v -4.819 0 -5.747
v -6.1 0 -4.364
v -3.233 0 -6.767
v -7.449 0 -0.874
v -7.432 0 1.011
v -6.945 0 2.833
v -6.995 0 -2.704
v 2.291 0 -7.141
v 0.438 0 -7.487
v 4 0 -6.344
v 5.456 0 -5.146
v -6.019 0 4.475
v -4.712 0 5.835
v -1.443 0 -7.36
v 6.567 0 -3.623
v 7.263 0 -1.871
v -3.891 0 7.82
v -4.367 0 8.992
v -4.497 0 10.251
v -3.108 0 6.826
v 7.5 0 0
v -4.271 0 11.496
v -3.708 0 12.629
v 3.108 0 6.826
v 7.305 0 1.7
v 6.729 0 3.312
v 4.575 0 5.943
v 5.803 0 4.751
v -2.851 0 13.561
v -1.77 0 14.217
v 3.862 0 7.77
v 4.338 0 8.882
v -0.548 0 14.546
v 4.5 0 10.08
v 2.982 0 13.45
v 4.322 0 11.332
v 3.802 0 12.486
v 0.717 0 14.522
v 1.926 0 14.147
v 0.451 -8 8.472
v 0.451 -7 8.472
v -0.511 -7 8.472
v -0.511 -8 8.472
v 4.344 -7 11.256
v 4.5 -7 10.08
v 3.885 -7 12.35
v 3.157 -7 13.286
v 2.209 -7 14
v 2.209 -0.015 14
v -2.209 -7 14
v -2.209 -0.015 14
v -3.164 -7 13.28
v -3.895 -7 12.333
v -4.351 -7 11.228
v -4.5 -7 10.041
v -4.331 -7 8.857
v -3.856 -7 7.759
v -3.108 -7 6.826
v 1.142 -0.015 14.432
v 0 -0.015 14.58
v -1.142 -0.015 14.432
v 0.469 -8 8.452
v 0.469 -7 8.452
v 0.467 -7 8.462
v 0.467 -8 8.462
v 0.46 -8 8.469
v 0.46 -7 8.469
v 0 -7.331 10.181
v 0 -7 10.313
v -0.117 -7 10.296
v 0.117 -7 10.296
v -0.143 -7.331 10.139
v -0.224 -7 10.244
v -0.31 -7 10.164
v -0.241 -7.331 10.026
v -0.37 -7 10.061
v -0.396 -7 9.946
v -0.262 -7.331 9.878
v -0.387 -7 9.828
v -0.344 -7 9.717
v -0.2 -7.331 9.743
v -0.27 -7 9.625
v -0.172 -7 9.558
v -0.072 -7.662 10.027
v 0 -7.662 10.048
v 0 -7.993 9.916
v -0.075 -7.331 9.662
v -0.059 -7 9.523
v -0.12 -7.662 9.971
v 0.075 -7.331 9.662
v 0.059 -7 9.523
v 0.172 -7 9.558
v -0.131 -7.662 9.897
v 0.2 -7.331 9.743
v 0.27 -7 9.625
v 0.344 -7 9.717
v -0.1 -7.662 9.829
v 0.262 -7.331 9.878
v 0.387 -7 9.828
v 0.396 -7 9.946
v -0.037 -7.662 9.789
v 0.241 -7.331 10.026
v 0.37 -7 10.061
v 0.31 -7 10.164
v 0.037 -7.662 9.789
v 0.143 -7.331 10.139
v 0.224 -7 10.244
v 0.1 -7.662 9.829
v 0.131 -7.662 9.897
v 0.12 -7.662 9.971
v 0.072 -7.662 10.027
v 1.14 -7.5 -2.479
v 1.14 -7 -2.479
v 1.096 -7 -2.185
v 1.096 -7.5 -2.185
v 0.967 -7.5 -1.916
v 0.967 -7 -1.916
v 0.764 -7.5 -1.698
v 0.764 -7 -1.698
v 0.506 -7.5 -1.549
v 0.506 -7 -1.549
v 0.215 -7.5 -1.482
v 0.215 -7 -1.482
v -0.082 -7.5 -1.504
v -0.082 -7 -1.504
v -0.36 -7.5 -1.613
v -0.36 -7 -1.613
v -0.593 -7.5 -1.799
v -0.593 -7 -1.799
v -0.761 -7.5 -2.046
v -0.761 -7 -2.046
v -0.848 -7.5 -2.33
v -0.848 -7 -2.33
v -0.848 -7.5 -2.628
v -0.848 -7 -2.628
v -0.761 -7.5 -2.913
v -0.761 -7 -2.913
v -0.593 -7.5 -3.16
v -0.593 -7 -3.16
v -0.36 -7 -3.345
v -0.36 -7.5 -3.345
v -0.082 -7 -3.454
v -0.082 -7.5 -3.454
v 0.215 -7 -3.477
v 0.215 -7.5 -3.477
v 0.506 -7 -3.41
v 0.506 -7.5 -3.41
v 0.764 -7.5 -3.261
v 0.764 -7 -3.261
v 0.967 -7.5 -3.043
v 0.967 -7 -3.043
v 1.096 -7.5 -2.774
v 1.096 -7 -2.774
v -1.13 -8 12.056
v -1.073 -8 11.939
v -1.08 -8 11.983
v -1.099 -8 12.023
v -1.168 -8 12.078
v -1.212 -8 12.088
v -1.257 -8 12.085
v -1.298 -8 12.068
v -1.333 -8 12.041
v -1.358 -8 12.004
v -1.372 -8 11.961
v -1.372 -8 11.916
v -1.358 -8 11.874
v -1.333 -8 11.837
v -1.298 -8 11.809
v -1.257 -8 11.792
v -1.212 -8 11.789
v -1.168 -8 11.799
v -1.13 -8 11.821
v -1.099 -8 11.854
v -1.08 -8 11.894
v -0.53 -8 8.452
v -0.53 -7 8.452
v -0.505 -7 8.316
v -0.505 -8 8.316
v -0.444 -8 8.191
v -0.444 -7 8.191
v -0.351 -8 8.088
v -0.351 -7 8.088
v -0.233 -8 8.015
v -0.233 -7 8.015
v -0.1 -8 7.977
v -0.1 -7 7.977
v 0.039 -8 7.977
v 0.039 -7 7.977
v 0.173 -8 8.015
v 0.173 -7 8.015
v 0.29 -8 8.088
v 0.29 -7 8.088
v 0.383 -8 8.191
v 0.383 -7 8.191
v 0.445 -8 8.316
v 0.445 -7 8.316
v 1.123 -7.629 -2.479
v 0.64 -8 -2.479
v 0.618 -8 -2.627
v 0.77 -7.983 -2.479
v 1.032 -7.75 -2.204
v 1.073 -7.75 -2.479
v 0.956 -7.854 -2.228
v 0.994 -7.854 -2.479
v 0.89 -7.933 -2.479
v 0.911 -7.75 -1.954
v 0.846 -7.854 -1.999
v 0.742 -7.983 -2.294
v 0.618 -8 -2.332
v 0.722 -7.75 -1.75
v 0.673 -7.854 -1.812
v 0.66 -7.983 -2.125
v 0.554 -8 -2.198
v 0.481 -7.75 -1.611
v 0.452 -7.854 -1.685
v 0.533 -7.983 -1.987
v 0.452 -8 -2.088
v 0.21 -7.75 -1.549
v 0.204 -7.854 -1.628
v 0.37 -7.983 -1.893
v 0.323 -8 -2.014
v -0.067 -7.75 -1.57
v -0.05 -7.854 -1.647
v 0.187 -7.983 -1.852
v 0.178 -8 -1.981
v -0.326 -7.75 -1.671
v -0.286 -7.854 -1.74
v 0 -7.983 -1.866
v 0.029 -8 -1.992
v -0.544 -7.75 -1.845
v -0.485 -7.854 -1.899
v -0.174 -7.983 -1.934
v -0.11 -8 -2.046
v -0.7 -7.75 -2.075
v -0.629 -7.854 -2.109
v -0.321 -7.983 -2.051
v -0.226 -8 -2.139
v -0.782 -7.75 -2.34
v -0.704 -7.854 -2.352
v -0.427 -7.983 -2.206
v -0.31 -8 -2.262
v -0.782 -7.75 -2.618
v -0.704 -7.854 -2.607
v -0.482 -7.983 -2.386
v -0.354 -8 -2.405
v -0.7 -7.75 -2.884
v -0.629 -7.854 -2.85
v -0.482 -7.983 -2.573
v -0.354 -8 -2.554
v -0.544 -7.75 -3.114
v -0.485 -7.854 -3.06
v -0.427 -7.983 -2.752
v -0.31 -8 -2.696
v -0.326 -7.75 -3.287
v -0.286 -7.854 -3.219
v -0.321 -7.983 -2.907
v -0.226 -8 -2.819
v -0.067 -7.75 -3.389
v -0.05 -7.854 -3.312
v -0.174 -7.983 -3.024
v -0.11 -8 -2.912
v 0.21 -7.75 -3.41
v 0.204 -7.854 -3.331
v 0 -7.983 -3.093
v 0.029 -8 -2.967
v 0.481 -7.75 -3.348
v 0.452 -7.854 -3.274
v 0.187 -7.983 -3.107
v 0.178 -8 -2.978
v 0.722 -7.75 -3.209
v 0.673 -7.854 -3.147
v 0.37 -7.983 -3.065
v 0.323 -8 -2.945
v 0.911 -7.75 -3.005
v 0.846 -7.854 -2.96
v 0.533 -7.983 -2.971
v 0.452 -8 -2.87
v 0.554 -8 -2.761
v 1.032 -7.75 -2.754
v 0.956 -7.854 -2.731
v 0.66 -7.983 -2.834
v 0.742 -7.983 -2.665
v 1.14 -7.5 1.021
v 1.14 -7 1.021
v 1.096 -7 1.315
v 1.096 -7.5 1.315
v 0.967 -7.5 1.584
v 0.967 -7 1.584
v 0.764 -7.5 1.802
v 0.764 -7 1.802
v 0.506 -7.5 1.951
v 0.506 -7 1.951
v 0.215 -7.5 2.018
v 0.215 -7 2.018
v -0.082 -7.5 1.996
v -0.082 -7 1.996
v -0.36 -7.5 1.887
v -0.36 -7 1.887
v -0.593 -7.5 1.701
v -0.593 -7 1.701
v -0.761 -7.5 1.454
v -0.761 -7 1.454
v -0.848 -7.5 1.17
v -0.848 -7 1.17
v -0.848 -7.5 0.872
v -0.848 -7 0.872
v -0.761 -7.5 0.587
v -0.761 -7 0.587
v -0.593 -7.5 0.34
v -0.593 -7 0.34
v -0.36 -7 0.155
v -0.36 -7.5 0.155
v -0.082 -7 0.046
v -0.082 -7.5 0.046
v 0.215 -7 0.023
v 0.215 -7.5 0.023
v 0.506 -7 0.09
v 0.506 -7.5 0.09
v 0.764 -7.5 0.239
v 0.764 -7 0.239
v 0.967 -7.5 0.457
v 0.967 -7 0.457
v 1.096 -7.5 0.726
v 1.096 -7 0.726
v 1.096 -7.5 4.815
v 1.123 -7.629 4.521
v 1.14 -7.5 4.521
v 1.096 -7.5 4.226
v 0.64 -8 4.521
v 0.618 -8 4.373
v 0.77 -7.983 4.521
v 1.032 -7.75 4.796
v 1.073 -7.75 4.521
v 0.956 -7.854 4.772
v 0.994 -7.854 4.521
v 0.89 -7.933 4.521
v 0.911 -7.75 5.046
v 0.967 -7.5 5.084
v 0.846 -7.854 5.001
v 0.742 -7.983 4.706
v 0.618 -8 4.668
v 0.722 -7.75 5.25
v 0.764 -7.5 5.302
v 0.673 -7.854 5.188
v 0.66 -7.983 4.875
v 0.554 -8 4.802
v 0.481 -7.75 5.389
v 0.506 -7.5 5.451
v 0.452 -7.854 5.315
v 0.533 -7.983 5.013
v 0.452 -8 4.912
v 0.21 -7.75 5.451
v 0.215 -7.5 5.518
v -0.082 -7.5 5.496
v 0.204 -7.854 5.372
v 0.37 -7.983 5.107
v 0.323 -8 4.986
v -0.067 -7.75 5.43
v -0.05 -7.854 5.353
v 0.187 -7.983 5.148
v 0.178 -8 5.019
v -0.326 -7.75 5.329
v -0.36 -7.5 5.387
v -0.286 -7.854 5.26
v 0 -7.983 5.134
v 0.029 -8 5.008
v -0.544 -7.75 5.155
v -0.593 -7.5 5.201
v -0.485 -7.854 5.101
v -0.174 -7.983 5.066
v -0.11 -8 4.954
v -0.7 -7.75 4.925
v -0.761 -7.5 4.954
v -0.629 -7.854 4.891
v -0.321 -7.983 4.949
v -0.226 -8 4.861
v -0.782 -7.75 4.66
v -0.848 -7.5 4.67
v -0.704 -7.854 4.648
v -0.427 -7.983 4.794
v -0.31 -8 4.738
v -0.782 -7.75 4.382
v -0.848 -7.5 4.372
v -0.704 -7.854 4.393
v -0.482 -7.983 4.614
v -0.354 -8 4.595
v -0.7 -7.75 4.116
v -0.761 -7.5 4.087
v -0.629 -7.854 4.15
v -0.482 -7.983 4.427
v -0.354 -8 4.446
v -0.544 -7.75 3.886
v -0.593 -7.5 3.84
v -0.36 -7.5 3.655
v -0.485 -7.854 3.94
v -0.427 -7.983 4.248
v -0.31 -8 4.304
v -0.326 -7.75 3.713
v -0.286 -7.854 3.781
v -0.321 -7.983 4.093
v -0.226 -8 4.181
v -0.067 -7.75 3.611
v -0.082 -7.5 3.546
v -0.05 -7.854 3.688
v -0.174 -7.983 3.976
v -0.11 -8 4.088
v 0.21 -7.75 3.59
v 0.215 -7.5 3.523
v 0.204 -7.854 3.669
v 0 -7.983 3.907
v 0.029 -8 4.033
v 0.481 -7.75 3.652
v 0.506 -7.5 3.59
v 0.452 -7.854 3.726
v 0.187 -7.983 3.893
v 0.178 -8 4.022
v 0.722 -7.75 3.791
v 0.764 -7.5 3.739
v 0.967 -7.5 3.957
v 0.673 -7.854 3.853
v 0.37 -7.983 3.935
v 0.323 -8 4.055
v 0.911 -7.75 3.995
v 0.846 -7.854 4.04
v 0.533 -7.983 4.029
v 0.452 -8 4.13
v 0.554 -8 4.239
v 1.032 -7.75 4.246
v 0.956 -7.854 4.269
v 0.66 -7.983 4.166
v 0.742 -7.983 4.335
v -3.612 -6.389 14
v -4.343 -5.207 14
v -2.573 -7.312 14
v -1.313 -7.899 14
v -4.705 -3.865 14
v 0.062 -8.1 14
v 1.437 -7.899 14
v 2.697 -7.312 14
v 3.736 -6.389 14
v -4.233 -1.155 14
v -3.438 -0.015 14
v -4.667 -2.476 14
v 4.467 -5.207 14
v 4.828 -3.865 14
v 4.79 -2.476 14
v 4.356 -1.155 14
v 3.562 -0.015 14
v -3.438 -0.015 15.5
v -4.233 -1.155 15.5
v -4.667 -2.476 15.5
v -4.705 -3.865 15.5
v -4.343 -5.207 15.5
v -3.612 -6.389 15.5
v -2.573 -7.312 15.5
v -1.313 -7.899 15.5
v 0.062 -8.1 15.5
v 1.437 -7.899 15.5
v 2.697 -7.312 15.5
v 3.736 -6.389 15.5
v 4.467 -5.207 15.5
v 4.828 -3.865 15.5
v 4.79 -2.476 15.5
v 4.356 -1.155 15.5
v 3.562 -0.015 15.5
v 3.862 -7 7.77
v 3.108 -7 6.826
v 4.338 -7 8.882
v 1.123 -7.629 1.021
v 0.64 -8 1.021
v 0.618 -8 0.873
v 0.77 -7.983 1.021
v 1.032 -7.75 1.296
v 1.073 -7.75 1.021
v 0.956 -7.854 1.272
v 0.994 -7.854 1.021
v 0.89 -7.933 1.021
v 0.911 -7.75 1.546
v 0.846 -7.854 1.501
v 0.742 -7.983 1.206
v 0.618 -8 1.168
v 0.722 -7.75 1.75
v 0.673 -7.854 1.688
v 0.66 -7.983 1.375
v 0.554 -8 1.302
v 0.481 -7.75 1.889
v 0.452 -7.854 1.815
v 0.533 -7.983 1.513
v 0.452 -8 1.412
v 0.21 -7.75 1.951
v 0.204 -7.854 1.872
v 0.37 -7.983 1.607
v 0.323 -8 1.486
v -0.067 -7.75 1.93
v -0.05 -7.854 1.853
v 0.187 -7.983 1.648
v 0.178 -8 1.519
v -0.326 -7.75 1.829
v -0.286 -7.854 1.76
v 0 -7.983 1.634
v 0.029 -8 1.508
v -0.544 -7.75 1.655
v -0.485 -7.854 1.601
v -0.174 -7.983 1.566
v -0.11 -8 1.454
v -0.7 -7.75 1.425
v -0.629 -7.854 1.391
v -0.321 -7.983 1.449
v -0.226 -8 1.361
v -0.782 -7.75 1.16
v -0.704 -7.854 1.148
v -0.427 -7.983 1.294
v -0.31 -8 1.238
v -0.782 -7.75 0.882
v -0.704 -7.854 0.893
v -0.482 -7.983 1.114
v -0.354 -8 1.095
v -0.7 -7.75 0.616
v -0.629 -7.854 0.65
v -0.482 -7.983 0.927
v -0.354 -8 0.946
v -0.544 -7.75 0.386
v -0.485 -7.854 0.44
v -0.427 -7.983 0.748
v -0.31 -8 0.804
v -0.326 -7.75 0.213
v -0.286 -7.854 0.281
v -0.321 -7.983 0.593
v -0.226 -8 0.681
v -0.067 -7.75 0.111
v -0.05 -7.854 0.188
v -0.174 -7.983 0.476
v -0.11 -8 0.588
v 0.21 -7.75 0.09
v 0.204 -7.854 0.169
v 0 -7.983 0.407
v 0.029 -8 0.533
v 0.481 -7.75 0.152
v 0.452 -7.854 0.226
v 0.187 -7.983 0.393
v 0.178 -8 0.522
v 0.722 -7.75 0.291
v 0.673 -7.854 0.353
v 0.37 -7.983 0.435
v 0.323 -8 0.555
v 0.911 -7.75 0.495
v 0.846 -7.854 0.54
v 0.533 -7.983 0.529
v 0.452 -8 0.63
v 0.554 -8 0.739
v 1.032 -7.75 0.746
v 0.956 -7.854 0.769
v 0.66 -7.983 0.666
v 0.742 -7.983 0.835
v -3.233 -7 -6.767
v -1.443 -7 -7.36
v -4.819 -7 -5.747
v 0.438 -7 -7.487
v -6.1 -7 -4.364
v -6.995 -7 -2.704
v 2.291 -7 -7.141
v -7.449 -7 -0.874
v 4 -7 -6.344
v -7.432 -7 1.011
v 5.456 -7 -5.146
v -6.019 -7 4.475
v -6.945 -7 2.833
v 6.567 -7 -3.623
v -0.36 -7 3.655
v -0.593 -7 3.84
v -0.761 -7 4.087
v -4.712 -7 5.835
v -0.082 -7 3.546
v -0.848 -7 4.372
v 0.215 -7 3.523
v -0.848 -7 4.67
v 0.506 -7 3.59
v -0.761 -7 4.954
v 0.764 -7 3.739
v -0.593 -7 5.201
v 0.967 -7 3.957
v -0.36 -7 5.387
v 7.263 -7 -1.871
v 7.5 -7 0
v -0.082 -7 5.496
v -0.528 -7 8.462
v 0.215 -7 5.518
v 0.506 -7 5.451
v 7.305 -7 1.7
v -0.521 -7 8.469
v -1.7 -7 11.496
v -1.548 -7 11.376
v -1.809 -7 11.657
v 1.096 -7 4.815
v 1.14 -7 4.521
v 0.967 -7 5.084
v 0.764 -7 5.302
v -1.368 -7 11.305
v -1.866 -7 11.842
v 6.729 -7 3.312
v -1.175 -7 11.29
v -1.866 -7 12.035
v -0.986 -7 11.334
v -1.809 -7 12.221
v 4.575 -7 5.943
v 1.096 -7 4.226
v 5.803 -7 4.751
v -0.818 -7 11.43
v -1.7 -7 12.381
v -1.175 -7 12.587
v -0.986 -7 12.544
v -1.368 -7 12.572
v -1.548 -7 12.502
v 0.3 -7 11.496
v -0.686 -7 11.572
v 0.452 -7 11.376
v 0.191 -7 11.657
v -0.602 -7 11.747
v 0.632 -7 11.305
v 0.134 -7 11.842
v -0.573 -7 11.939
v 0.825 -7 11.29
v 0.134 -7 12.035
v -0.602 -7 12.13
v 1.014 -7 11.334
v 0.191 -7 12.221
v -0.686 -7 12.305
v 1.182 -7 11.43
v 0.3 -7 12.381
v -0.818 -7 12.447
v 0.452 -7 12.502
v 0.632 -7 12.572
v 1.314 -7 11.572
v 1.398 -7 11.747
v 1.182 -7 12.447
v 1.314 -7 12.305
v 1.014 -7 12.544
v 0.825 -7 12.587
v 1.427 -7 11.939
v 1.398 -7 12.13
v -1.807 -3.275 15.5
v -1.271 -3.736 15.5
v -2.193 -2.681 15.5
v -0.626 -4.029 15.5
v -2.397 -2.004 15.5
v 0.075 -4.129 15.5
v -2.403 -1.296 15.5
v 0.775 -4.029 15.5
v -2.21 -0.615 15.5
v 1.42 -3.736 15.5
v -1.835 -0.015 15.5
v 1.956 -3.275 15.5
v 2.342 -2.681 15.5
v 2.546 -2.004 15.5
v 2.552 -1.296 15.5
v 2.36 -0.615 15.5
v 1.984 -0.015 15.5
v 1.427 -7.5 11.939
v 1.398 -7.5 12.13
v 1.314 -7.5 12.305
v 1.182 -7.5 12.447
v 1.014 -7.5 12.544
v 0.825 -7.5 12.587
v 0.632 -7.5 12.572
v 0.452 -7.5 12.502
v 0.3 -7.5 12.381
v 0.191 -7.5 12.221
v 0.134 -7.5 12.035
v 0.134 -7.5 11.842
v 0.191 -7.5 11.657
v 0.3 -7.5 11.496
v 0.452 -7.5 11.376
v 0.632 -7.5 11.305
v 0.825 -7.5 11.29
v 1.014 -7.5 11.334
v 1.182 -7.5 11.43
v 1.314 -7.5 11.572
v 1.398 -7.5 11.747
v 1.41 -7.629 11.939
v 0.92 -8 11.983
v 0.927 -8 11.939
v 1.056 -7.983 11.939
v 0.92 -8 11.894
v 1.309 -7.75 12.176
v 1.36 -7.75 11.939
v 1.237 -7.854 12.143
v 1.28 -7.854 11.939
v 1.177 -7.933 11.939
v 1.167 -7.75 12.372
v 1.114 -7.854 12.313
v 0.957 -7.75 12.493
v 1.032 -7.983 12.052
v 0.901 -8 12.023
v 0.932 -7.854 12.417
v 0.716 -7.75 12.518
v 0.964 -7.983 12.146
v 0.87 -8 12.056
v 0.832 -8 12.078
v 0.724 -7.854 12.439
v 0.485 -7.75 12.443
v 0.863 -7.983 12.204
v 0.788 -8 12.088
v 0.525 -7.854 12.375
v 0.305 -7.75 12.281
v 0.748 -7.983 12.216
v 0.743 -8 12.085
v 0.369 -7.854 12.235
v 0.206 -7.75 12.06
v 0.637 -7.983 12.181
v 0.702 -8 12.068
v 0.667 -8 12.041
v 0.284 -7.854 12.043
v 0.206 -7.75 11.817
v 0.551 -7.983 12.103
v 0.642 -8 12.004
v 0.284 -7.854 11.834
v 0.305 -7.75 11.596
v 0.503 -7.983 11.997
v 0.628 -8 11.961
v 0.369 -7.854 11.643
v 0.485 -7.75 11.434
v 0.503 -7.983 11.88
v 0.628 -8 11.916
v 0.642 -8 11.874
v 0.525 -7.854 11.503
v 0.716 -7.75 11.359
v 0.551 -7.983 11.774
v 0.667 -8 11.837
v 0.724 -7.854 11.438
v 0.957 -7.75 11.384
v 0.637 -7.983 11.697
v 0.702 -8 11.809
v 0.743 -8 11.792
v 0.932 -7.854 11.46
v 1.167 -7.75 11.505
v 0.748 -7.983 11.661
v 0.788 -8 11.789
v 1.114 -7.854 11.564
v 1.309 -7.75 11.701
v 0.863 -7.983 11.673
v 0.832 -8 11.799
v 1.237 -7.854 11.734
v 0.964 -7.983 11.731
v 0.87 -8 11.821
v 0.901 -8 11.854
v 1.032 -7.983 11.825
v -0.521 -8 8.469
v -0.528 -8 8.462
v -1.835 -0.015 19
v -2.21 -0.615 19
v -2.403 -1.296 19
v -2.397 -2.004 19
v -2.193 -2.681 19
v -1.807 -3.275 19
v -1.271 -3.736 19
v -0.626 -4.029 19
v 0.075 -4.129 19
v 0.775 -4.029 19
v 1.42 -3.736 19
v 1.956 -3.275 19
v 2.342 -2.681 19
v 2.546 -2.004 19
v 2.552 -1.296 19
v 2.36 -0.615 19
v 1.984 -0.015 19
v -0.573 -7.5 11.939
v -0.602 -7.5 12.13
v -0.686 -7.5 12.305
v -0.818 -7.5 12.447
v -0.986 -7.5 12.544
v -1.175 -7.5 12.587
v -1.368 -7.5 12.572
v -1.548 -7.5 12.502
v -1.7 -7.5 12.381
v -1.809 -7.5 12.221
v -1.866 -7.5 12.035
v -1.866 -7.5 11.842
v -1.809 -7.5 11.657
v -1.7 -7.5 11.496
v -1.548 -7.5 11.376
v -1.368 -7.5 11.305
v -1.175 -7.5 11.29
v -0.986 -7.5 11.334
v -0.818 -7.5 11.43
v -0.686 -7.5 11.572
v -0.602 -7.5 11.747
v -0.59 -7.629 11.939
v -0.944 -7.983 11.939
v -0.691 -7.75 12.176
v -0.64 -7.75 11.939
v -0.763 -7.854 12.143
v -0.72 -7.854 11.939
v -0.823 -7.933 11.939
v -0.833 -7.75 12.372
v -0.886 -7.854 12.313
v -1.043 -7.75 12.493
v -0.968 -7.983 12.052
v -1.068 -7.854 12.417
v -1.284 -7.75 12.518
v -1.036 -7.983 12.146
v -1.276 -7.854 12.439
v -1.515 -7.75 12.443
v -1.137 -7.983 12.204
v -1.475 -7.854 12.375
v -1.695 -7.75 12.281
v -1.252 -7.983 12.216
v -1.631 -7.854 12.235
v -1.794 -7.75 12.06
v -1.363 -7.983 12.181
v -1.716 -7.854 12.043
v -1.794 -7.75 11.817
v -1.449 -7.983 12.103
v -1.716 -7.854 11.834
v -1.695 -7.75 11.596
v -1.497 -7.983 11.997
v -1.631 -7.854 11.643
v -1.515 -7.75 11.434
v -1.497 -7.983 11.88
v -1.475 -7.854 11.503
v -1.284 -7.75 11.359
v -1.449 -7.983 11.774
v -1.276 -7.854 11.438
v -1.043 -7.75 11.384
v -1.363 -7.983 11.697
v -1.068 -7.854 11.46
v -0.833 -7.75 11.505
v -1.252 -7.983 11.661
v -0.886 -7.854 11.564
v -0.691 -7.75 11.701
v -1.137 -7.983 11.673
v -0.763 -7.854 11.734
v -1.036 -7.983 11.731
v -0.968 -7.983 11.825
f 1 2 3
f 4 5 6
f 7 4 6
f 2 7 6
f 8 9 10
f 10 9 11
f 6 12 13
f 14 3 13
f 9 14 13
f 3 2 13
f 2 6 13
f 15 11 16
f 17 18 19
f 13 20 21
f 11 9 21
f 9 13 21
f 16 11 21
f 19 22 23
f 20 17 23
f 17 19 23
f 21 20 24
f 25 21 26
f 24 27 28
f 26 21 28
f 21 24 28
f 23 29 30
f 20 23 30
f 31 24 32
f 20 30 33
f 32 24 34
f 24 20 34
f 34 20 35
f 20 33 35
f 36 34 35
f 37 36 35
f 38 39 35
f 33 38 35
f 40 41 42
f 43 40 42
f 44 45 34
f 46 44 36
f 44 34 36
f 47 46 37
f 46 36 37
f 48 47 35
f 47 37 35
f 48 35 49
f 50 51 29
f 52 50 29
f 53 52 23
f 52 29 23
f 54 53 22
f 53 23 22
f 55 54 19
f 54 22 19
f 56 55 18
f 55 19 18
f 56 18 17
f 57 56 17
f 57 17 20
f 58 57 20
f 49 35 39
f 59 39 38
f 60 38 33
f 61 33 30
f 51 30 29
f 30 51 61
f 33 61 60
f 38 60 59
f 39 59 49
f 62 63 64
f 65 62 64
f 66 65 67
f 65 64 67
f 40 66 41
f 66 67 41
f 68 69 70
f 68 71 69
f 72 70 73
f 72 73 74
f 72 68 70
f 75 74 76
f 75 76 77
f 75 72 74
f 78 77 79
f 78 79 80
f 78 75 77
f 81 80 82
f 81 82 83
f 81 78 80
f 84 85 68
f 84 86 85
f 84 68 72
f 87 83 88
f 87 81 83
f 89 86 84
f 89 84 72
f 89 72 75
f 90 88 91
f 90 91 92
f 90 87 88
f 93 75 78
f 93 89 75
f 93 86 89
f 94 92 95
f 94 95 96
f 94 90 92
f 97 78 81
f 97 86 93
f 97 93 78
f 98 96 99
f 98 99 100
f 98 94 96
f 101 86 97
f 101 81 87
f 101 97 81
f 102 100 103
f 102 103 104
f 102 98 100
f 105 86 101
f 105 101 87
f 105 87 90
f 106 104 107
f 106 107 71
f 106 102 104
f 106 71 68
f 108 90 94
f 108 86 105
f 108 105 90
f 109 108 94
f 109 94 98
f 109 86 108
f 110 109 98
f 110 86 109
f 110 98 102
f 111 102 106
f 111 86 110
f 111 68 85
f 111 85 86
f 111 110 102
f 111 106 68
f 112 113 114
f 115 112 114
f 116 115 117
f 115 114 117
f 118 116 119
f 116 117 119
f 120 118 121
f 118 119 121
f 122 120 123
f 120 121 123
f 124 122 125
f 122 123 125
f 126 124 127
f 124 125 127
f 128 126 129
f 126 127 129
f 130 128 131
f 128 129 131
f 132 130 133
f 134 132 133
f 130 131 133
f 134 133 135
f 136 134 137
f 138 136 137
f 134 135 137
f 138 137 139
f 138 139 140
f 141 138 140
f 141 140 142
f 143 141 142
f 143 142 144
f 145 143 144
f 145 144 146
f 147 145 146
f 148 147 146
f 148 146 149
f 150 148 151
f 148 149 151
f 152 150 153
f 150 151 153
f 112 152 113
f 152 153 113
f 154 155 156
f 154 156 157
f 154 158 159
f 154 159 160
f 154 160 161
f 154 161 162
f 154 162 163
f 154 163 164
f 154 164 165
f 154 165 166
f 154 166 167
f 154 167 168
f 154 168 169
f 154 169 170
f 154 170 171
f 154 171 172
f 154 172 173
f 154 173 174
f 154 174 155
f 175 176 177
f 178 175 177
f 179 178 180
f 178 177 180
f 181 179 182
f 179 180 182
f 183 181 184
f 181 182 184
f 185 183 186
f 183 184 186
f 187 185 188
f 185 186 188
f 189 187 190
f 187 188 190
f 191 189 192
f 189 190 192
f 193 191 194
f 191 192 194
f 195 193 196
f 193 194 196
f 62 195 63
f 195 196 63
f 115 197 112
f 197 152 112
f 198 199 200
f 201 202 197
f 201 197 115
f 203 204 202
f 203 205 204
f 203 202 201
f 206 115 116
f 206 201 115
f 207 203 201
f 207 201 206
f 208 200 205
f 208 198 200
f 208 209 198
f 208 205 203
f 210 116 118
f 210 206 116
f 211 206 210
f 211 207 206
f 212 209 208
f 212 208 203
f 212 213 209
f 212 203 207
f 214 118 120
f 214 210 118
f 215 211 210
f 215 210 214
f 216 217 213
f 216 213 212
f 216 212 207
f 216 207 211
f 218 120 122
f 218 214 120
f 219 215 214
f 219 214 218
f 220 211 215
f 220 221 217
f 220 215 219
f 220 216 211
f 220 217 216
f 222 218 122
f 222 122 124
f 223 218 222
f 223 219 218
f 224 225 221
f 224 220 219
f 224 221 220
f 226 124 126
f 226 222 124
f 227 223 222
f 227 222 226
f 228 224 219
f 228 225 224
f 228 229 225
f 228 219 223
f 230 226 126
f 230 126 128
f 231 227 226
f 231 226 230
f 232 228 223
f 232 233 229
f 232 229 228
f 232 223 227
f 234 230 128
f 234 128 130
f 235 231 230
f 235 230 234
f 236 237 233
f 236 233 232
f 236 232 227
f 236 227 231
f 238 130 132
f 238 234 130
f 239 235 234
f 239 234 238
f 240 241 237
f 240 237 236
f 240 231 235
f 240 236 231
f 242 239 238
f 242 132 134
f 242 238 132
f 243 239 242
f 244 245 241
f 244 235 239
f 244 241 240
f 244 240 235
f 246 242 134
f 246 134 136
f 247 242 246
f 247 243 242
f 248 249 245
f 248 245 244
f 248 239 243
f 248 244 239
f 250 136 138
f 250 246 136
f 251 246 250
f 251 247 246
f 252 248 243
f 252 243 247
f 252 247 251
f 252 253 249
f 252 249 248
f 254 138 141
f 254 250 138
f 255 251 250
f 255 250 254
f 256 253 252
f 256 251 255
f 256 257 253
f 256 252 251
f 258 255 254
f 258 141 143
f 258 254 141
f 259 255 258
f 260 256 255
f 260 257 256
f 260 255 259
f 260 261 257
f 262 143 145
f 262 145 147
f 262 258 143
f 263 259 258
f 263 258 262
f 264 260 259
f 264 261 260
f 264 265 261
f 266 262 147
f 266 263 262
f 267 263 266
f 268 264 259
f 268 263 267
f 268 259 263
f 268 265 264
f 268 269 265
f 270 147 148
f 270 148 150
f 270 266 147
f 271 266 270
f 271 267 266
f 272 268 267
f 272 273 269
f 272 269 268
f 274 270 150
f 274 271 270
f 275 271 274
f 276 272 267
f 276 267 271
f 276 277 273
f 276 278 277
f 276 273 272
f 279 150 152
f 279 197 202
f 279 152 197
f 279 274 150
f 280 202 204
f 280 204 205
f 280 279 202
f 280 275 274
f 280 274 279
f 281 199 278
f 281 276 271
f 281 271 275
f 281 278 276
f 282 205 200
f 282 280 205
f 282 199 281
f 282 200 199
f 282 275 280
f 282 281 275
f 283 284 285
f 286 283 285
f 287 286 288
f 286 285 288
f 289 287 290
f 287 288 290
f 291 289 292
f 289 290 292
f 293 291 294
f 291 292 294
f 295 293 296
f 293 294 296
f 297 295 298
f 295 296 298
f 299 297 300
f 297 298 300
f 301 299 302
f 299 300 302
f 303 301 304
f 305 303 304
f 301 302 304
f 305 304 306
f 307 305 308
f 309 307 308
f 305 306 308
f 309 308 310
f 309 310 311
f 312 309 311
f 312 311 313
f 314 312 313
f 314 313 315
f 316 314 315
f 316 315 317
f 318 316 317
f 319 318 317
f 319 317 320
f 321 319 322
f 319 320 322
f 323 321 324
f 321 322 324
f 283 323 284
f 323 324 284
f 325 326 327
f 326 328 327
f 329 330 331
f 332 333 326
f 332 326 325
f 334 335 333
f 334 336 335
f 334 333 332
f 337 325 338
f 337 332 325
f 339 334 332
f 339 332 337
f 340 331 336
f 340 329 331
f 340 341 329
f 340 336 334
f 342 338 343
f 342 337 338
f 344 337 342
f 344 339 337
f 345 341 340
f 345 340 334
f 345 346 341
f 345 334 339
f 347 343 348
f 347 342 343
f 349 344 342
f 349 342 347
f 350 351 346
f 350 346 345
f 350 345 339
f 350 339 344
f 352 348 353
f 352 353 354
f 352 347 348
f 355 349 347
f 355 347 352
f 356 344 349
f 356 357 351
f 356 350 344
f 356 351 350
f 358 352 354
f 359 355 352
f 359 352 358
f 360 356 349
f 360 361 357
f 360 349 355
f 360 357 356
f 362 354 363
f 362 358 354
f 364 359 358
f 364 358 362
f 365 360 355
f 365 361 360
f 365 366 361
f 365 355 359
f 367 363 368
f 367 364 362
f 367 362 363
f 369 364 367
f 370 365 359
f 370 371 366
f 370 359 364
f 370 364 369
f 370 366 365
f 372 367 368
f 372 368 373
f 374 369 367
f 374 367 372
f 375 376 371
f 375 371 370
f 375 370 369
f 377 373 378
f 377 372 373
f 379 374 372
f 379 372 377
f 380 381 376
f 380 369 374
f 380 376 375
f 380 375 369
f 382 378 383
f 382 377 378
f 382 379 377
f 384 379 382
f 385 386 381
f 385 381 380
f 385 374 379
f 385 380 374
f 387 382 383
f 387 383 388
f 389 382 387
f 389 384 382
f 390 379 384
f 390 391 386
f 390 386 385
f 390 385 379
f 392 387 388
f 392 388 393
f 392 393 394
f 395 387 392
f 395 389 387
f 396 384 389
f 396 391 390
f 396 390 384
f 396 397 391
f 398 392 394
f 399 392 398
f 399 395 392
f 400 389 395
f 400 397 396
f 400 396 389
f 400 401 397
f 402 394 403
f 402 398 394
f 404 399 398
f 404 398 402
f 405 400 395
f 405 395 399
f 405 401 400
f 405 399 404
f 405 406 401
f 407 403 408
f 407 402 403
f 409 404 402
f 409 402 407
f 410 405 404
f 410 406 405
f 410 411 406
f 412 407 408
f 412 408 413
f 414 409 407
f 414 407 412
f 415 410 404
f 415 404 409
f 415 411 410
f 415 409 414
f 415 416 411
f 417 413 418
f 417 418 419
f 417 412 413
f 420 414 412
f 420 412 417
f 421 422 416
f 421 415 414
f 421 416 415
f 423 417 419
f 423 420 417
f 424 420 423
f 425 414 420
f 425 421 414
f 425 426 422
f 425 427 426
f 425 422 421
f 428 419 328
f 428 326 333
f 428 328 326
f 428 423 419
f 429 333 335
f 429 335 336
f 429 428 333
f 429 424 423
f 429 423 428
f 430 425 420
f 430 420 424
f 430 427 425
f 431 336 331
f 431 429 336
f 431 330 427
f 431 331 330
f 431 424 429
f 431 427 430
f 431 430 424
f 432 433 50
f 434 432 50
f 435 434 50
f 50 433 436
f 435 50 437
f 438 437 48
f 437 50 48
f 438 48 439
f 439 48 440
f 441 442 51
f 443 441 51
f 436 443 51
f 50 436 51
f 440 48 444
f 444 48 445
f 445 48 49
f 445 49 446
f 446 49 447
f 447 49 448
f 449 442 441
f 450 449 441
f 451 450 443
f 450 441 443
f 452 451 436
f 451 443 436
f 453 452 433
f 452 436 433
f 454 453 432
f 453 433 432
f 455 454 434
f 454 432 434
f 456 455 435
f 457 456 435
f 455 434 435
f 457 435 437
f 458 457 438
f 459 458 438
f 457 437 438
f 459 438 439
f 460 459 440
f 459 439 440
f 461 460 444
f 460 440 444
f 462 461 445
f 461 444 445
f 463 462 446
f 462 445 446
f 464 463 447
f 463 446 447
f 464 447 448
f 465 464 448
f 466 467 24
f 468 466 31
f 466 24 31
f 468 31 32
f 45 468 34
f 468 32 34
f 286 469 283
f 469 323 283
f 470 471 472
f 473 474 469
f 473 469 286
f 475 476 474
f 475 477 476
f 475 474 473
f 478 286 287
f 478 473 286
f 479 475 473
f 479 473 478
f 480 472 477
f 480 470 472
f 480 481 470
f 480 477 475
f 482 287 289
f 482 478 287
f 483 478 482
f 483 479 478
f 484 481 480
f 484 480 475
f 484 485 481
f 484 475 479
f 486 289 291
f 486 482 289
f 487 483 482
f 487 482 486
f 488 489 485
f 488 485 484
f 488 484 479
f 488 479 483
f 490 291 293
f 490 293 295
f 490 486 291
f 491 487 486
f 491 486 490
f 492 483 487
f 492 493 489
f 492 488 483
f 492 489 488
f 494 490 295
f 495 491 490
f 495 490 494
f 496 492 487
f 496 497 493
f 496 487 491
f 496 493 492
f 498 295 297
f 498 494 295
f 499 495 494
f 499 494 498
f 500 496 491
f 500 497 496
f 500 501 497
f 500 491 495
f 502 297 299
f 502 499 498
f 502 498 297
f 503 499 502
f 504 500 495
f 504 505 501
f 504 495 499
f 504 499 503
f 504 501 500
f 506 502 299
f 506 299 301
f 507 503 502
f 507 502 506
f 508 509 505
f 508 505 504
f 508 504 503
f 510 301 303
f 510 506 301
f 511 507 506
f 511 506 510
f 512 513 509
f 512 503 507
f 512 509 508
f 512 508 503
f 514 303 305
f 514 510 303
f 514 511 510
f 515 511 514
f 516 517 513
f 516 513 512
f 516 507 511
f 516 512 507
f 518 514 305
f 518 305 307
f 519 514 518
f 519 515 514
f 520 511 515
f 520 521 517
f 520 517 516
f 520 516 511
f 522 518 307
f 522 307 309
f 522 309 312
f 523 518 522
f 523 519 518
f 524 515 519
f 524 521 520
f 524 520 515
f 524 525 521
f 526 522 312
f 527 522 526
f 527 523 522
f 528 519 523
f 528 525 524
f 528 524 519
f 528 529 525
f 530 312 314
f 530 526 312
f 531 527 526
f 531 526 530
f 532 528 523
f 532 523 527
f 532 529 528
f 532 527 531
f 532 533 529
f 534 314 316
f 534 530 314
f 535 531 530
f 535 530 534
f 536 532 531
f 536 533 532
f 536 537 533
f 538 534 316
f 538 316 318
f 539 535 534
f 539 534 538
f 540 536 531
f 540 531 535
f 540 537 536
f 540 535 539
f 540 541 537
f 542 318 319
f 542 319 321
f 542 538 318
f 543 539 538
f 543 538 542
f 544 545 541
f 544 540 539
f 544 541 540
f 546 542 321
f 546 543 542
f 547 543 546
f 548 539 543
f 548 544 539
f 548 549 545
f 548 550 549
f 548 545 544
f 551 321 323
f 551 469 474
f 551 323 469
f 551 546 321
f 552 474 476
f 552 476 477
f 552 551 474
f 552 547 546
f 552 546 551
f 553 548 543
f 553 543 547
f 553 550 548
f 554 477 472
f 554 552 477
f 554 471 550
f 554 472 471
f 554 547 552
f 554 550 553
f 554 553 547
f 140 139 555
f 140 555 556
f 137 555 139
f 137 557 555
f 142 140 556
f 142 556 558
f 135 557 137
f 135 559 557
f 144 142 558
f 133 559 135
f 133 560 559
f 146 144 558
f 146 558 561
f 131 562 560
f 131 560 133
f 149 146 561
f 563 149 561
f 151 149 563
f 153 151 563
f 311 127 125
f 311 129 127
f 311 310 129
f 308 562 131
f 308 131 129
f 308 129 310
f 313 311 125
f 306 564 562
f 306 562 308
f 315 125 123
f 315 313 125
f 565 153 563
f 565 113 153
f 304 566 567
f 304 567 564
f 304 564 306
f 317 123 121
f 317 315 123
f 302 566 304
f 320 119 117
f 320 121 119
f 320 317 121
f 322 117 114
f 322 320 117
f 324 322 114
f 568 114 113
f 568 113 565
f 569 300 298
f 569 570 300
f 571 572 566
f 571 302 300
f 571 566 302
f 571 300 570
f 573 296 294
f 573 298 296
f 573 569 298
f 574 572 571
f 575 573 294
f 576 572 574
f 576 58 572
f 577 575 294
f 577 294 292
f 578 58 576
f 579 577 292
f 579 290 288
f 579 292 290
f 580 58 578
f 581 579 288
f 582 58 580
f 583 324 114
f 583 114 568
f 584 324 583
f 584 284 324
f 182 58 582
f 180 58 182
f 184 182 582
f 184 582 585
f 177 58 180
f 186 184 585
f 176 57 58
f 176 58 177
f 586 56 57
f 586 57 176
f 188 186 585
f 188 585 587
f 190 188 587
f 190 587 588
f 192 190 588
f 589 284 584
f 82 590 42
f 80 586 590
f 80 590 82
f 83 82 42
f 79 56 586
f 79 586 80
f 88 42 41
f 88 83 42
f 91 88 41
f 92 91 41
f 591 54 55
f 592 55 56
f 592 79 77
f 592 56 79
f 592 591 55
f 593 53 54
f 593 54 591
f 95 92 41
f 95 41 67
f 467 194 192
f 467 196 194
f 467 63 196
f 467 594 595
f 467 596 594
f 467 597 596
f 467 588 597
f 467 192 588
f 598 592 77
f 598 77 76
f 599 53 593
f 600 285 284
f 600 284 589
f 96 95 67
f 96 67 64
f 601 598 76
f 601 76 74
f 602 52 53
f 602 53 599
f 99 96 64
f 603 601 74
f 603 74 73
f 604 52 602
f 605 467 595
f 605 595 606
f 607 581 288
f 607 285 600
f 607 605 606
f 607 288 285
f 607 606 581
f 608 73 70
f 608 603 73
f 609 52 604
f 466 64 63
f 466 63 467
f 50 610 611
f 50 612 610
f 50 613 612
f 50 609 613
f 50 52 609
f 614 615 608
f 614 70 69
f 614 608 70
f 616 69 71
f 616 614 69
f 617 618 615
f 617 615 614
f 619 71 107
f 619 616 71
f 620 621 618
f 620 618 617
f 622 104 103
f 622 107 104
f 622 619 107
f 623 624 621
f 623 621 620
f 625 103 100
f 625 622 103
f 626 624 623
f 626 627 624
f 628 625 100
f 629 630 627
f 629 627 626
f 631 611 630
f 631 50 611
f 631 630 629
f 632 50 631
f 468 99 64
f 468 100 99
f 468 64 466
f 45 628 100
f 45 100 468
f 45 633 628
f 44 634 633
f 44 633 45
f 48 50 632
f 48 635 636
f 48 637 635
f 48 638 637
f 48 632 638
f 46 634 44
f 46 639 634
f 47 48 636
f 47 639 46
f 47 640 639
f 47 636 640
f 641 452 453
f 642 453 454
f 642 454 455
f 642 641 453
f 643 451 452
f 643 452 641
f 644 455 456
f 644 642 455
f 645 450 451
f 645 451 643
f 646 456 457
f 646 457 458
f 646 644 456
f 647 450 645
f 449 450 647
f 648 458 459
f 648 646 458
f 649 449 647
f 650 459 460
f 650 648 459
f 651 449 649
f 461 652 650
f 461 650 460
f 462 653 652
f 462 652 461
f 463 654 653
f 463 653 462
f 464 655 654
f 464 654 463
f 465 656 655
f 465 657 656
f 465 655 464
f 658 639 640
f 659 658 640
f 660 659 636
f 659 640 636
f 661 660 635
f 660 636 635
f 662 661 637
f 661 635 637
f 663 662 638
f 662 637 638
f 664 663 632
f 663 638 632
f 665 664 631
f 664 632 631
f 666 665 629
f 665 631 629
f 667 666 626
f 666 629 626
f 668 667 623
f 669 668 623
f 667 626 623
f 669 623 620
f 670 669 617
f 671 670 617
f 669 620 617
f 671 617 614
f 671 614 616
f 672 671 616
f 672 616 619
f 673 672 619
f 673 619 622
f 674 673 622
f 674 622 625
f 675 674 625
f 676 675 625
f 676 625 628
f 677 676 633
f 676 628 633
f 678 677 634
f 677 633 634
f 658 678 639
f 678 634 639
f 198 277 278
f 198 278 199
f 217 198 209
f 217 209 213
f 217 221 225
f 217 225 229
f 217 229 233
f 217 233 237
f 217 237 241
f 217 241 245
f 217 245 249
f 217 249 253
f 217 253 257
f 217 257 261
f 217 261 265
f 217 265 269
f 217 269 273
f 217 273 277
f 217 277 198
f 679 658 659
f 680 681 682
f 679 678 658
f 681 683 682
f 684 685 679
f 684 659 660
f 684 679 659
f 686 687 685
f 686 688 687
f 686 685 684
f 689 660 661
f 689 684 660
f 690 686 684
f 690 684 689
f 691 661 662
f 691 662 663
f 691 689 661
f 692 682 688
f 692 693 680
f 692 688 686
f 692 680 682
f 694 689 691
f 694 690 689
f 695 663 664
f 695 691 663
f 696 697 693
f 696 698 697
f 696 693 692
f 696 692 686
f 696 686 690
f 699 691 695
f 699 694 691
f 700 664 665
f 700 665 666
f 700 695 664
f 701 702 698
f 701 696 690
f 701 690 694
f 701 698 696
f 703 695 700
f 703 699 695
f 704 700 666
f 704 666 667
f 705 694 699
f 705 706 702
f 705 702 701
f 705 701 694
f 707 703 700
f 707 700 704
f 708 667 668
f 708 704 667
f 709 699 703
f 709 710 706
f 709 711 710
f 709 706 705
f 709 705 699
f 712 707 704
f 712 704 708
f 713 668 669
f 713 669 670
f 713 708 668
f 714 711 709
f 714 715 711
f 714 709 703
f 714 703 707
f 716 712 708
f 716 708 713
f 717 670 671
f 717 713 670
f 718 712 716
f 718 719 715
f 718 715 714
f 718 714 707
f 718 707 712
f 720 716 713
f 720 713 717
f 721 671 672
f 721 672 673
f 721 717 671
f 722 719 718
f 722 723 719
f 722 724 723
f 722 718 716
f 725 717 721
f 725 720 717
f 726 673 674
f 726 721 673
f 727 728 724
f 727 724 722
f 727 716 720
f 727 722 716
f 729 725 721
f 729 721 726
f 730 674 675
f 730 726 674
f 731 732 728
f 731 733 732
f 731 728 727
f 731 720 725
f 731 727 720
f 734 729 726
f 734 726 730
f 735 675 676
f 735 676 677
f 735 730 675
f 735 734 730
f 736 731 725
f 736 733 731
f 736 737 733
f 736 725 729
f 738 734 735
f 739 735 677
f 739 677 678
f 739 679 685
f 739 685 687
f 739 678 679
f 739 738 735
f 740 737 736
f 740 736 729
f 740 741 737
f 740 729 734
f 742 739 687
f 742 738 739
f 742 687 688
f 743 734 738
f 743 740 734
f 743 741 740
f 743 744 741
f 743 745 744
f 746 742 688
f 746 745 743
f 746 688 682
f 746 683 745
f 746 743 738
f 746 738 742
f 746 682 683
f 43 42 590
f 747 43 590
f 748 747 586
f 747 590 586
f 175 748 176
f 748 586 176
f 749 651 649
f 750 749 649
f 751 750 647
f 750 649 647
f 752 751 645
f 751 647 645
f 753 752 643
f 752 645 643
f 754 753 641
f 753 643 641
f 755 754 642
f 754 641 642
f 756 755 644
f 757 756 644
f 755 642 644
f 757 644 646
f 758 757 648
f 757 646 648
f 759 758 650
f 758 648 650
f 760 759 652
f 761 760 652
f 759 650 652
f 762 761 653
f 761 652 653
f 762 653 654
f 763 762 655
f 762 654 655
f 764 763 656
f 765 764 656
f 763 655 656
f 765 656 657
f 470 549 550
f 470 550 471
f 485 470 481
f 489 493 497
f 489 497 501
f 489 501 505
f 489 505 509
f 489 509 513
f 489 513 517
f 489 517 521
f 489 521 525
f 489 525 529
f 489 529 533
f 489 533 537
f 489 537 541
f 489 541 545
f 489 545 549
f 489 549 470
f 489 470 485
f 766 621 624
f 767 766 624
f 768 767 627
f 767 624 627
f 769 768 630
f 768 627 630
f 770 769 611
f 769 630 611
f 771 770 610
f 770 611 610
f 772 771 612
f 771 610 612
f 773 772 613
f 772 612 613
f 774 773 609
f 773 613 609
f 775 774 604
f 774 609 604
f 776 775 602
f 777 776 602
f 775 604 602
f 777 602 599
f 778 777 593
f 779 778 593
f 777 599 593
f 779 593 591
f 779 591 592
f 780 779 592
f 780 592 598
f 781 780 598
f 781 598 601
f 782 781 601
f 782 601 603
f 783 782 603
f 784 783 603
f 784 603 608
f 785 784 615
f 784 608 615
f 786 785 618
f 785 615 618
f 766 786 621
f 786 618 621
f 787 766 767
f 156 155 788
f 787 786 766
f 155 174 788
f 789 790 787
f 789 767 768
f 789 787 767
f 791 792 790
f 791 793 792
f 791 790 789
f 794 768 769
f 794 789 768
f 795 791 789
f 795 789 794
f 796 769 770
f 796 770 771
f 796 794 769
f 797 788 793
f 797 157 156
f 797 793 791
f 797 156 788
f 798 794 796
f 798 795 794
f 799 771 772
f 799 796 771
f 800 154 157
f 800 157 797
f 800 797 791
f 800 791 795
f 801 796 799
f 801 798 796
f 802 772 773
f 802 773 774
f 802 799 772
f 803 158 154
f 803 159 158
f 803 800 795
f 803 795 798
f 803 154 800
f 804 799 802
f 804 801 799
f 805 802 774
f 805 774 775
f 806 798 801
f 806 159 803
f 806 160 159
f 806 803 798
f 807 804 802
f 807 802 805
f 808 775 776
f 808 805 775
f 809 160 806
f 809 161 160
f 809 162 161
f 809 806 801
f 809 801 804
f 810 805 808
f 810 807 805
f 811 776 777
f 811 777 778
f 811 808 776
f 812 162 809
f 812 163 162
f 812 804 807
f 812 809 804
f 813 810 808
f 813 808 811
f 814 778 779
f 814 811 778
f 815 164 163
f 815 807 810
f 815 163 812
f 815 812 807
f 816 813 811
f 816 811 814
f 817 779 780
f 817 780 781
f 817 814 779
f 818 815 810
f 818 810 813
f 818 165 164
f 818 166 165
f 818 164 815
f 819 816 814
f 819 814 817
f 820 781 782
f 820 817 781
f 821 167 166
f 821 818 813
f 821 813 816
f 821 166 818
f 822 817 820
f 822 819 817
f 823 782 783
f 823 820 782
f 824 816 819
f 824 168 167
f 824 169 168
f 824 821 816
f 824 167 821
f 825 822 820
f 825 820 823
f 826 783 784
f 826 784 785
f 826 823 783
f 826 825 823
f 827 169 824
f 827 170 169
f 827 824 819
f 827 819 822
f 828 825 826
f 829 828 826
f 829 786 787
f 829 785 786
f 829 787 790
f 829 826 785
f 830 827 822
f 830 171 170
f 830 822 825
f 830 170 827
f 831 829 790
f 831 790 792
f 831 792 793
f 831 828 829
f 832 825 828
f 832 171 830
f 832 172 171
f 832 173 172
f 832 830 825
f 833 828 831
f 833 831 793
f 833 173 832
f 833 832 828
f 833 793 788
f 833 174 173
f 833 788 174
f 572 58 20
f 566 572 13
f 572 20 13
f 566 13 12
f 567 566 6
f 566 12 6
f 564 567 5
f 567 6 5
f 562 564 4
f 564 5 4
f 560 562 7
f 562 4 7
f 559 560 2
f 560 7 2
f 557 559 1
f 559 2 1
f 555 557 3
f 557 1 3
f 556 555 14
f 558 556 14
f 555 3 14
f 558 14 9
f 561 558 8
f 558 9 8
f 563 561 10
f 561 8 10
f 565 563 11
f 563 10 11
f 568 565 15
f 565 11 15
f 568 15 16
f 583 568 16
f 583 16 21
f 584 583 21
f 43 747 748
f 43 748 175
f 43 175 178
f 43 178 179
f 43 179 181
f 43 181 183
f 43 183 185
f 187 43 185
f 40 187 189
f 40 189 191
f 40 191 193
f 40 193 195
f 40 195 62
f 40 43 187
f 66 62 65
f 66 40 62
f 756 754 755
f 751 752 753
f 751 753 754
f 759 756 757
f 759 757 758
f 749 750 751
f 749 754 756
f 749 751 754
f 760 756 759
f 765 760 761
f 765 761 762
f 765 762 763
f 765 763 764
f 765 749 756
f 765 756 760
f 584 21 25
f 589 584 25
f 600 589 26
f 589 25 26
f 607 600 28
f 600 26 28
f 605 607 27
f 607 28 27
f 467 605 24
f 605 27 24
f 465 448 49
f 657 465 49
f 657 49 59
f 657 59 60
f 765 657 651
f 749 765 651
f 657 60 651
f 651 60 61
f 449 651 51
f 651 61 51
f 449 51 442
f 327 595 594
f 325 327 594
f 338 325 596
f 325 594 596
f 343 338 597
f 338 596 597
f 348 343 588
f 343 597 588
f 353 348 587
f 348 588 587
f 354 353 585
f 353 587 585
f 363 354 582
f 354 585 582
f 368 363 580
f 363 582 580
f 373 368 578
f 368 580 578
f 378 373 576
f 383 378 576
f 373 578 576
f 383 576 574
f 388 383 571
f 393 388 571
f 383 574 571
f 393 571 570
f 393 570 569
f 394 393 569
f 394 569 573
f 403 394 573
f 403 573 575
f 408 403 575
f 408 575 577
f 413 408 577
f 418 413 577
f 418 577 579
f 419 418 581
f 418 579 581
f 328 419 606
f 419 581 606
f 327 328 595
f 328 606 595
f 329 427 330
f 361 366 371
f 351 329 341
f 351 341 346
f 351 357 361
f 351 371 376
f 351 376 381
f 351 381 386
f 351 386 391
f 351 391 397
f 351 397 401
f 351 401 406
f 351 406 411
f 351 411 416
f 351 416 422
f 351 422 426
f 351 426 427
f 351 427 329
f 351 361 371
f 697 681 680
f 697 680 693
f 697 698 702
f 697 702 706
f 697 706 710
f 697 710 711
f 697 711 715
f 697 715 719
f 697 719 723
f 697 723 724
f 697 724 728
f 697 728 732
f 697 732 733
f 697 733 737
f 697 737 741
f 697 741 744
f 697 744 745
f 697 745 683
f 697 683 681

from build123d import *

# Parameters (mm, degrees)
F1_DEPTH  = 7
F2_DEPTH  = 7
F3_R      = 1
F4_DEPTH  = 1
F5_DEPTH  = 1
F6_DEPTH  = 1
F7_R      = 0.65
F8_DEPTH  = 1
F9_DEPTH  = 1
F14_DEPTH = 1.5
F16_DEPTH = 3.5
F18_DEPTH = 1
F19_R     = 0.5


# Not quite as in the source:
# - a feature names something its author has since deleted; it is built from what else it names


with BuildPart() as f1:
    # F0 (on Front) → F1 (new body)
    with BuildSketch(Plane.XZ):
        with BuildLine():
            ThreePointArc((-3.1083265336, 6.8255626992), (0, 5.5795304558), (3.1083265336, 6.8255626992))
            ThreePointArc((3.1083265336, 6.8255626992), (0, 7.5), (-3.1083265336, 6.8255626992))
        make_face()
        with BuildLine():
            ThreePointArc((-3.1083265336, 6.8255626992), (0, 7.5), (3.1083265336, 6.8255626992))
            ThreePointArc((3.1083265336, 6.8255626992), (4.1374792689, 8.3099922958), (4.5, 10.0795304558))
            ThreePointArc((4.5, 10.0795304558), (-1.7695381599, 14.2170097247), (-3.1083265336, 6.8255626992))
        make_face()
    extrude(amount=F1_DEPTH)

    # F0 (on Front) → F2 (join)
    with BuildSketch(Plane.XZ):
        with BuildLine():
            ThreePointArc((-3.1083265336, 6.8255626992), (-4.0581739119, -6.3072358844), (7.5, 0))
            ThreePointArc((7.5, 0), (6.3072358844, 4.0581739119), (3.1083265336, 6.8255626992))
            ThreePointArc((3.1083265336, 6.8255626992), (0, 5.5795304558), (-3.1083265336, 6.8255626992))
        make_face()
    extrude(amount=F2_DEPTH)

    # F3 (on face) → F4 (join)
    with BuildSketch(Plane.XZ.offset(7)):
        with Locations((0.1404315871, 4.5206134686)):
            Circle(F3_R)
    extrude(amount=F4_DEPTH)

    # F3 (on face) → F5 (join)
    with BuildSketch(Plane.XZ.offset(7)):
        with Locations((0.1404315871, 1.0206134686)):
            Circle(F3_R)
    extrude(amount=F5_DEPTH)

    # F3 (on face) → F6 (join)
    with BuildSketch(Plane.XZ.offset(7)):
        with Locations((0.1404315871, -2.4793865314)):
            Circle(F3_R)
    extrude(amount=F6_DEPTH)

    # F7 (on face) → F8 (join)
    with BuildSketch(Plane.XZ.offset(7)):
        with Locations((-1.2232928476, 11.9385918571)):
            Circle(F7_R)
    extrude(amount=F8_DEPTH)

    # F7 (on face) → F9 (join)
    with BuildSketch(Plane.XZ.offset(7)):
        with Locations((0.7767071524, 11.9385918571)):
            Circle(F7_R)
    extrude(amount=F9_DEPTH)

    # F10 (on Right) → F11 (revolve)
    with BuildSketch(Plane.YZ):
        Polygon((-7.9928543597, 9.9160444998), (-6.9928543597, 9.9160444998), (-6.9928543597, 10.3160444998), align=None)
    revolve(axis=Axis((0, -7.4928543597, 9.9160444998), (0, -1, 0)))

    # F13 (on offset) → F14 (join)
    with BuildSketch(Plane.XY.offset(14)):
        with BuildLine():
            Line((3.561746113, -0.0150235719), (-3.438253887, -0.0150235719))
            ThreePointArc((-3.438253887, -0.0150235719), (0.061746113, -8.099837113), (3.561746113, -0.0150235719))
        make_face()
    extrude(amount=F14_DEPTH)

    # F15 (on face) → F16 (join)
    with BuildSketch(Plane.XY.offset(15.5)):
        with BuildLine():
            Line((1.9837659688, -0.0150235719), (-1.8346020611, -0.0150235719))
            ThreePointArc((-1.8346020611, -0.0150235719), (0.0745819538, -4.1290298907), (1.9837659688, -0.0150235719))
        make_face()
    extrude(amount=F16_DEPTH)

    # F17 (on face) → F18 (join)
    with BuildSketch(Plane.XZ.offset(7)):
        with BuildLine():
            Line((0.4505876301, 8.4716784917), (-0.5113184951, 8.4716784917))
            ThreePointArc((-0.5113184951, 8.4716784917), (-0.5247841756, 8.4659470606), (-0.5299885637, 8.4522690419))
            ThreePointArc((-0.5299885637, 8.4522690419), (-0.0303654325, 7.9716784917), (0.4692576987, 8.4522690419))
            ThreePointArc((0.4692576987, 8.4522690419), (0.4640533106, 8.4659470606), (0.4505876301, 8.4716784917))
        make_face()
    extrude(amount=F18_DEPTH)

    # F19
    f19_edges = [f1.edges().sort_by_distance(p)[0] for p in [
        (-1.873293, -8, 11.938592),
        (0.126707, -8, 11.938592),
        (-0.859568, -8, 4.520613),
        (-0.859568, -8, 1.020613),
        (-0.859568, -8, -2.479387),
    ]]
    fillet(f19_edges, radius=F19_R)


solid = f1.part
